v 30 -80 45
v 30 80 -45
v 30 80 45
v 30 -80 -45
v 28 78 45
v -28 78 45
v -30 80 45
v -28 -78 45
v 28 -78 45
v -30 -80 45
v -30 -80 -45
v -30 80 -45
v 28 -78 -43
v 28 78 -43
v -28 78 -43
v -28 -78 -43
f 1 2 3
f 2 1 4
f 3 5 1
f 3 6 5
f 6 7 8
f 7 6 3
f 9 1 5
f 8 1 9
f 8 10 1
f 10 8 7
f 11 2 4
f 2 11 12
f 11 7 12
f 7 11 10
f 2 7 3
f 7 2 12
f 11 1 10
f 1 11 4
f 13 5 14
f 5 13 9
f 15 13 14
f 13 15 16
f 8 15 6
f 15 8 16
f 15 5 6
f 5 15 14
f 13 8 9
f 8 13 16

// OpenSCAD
// ========================================
// a 60 x 160 x 90 mm enclosure with 2 mm wall thickness
// NeuroCAD canonical IR; dimensions are millimetres
// ========================================
$fn = 48;

difference() {
  cube(size=[60, 160, 90], center=true);
  translate([0, 0, 1.1]) {
    cube(size=[56, 156, 88.2], center=true);
  }
}
